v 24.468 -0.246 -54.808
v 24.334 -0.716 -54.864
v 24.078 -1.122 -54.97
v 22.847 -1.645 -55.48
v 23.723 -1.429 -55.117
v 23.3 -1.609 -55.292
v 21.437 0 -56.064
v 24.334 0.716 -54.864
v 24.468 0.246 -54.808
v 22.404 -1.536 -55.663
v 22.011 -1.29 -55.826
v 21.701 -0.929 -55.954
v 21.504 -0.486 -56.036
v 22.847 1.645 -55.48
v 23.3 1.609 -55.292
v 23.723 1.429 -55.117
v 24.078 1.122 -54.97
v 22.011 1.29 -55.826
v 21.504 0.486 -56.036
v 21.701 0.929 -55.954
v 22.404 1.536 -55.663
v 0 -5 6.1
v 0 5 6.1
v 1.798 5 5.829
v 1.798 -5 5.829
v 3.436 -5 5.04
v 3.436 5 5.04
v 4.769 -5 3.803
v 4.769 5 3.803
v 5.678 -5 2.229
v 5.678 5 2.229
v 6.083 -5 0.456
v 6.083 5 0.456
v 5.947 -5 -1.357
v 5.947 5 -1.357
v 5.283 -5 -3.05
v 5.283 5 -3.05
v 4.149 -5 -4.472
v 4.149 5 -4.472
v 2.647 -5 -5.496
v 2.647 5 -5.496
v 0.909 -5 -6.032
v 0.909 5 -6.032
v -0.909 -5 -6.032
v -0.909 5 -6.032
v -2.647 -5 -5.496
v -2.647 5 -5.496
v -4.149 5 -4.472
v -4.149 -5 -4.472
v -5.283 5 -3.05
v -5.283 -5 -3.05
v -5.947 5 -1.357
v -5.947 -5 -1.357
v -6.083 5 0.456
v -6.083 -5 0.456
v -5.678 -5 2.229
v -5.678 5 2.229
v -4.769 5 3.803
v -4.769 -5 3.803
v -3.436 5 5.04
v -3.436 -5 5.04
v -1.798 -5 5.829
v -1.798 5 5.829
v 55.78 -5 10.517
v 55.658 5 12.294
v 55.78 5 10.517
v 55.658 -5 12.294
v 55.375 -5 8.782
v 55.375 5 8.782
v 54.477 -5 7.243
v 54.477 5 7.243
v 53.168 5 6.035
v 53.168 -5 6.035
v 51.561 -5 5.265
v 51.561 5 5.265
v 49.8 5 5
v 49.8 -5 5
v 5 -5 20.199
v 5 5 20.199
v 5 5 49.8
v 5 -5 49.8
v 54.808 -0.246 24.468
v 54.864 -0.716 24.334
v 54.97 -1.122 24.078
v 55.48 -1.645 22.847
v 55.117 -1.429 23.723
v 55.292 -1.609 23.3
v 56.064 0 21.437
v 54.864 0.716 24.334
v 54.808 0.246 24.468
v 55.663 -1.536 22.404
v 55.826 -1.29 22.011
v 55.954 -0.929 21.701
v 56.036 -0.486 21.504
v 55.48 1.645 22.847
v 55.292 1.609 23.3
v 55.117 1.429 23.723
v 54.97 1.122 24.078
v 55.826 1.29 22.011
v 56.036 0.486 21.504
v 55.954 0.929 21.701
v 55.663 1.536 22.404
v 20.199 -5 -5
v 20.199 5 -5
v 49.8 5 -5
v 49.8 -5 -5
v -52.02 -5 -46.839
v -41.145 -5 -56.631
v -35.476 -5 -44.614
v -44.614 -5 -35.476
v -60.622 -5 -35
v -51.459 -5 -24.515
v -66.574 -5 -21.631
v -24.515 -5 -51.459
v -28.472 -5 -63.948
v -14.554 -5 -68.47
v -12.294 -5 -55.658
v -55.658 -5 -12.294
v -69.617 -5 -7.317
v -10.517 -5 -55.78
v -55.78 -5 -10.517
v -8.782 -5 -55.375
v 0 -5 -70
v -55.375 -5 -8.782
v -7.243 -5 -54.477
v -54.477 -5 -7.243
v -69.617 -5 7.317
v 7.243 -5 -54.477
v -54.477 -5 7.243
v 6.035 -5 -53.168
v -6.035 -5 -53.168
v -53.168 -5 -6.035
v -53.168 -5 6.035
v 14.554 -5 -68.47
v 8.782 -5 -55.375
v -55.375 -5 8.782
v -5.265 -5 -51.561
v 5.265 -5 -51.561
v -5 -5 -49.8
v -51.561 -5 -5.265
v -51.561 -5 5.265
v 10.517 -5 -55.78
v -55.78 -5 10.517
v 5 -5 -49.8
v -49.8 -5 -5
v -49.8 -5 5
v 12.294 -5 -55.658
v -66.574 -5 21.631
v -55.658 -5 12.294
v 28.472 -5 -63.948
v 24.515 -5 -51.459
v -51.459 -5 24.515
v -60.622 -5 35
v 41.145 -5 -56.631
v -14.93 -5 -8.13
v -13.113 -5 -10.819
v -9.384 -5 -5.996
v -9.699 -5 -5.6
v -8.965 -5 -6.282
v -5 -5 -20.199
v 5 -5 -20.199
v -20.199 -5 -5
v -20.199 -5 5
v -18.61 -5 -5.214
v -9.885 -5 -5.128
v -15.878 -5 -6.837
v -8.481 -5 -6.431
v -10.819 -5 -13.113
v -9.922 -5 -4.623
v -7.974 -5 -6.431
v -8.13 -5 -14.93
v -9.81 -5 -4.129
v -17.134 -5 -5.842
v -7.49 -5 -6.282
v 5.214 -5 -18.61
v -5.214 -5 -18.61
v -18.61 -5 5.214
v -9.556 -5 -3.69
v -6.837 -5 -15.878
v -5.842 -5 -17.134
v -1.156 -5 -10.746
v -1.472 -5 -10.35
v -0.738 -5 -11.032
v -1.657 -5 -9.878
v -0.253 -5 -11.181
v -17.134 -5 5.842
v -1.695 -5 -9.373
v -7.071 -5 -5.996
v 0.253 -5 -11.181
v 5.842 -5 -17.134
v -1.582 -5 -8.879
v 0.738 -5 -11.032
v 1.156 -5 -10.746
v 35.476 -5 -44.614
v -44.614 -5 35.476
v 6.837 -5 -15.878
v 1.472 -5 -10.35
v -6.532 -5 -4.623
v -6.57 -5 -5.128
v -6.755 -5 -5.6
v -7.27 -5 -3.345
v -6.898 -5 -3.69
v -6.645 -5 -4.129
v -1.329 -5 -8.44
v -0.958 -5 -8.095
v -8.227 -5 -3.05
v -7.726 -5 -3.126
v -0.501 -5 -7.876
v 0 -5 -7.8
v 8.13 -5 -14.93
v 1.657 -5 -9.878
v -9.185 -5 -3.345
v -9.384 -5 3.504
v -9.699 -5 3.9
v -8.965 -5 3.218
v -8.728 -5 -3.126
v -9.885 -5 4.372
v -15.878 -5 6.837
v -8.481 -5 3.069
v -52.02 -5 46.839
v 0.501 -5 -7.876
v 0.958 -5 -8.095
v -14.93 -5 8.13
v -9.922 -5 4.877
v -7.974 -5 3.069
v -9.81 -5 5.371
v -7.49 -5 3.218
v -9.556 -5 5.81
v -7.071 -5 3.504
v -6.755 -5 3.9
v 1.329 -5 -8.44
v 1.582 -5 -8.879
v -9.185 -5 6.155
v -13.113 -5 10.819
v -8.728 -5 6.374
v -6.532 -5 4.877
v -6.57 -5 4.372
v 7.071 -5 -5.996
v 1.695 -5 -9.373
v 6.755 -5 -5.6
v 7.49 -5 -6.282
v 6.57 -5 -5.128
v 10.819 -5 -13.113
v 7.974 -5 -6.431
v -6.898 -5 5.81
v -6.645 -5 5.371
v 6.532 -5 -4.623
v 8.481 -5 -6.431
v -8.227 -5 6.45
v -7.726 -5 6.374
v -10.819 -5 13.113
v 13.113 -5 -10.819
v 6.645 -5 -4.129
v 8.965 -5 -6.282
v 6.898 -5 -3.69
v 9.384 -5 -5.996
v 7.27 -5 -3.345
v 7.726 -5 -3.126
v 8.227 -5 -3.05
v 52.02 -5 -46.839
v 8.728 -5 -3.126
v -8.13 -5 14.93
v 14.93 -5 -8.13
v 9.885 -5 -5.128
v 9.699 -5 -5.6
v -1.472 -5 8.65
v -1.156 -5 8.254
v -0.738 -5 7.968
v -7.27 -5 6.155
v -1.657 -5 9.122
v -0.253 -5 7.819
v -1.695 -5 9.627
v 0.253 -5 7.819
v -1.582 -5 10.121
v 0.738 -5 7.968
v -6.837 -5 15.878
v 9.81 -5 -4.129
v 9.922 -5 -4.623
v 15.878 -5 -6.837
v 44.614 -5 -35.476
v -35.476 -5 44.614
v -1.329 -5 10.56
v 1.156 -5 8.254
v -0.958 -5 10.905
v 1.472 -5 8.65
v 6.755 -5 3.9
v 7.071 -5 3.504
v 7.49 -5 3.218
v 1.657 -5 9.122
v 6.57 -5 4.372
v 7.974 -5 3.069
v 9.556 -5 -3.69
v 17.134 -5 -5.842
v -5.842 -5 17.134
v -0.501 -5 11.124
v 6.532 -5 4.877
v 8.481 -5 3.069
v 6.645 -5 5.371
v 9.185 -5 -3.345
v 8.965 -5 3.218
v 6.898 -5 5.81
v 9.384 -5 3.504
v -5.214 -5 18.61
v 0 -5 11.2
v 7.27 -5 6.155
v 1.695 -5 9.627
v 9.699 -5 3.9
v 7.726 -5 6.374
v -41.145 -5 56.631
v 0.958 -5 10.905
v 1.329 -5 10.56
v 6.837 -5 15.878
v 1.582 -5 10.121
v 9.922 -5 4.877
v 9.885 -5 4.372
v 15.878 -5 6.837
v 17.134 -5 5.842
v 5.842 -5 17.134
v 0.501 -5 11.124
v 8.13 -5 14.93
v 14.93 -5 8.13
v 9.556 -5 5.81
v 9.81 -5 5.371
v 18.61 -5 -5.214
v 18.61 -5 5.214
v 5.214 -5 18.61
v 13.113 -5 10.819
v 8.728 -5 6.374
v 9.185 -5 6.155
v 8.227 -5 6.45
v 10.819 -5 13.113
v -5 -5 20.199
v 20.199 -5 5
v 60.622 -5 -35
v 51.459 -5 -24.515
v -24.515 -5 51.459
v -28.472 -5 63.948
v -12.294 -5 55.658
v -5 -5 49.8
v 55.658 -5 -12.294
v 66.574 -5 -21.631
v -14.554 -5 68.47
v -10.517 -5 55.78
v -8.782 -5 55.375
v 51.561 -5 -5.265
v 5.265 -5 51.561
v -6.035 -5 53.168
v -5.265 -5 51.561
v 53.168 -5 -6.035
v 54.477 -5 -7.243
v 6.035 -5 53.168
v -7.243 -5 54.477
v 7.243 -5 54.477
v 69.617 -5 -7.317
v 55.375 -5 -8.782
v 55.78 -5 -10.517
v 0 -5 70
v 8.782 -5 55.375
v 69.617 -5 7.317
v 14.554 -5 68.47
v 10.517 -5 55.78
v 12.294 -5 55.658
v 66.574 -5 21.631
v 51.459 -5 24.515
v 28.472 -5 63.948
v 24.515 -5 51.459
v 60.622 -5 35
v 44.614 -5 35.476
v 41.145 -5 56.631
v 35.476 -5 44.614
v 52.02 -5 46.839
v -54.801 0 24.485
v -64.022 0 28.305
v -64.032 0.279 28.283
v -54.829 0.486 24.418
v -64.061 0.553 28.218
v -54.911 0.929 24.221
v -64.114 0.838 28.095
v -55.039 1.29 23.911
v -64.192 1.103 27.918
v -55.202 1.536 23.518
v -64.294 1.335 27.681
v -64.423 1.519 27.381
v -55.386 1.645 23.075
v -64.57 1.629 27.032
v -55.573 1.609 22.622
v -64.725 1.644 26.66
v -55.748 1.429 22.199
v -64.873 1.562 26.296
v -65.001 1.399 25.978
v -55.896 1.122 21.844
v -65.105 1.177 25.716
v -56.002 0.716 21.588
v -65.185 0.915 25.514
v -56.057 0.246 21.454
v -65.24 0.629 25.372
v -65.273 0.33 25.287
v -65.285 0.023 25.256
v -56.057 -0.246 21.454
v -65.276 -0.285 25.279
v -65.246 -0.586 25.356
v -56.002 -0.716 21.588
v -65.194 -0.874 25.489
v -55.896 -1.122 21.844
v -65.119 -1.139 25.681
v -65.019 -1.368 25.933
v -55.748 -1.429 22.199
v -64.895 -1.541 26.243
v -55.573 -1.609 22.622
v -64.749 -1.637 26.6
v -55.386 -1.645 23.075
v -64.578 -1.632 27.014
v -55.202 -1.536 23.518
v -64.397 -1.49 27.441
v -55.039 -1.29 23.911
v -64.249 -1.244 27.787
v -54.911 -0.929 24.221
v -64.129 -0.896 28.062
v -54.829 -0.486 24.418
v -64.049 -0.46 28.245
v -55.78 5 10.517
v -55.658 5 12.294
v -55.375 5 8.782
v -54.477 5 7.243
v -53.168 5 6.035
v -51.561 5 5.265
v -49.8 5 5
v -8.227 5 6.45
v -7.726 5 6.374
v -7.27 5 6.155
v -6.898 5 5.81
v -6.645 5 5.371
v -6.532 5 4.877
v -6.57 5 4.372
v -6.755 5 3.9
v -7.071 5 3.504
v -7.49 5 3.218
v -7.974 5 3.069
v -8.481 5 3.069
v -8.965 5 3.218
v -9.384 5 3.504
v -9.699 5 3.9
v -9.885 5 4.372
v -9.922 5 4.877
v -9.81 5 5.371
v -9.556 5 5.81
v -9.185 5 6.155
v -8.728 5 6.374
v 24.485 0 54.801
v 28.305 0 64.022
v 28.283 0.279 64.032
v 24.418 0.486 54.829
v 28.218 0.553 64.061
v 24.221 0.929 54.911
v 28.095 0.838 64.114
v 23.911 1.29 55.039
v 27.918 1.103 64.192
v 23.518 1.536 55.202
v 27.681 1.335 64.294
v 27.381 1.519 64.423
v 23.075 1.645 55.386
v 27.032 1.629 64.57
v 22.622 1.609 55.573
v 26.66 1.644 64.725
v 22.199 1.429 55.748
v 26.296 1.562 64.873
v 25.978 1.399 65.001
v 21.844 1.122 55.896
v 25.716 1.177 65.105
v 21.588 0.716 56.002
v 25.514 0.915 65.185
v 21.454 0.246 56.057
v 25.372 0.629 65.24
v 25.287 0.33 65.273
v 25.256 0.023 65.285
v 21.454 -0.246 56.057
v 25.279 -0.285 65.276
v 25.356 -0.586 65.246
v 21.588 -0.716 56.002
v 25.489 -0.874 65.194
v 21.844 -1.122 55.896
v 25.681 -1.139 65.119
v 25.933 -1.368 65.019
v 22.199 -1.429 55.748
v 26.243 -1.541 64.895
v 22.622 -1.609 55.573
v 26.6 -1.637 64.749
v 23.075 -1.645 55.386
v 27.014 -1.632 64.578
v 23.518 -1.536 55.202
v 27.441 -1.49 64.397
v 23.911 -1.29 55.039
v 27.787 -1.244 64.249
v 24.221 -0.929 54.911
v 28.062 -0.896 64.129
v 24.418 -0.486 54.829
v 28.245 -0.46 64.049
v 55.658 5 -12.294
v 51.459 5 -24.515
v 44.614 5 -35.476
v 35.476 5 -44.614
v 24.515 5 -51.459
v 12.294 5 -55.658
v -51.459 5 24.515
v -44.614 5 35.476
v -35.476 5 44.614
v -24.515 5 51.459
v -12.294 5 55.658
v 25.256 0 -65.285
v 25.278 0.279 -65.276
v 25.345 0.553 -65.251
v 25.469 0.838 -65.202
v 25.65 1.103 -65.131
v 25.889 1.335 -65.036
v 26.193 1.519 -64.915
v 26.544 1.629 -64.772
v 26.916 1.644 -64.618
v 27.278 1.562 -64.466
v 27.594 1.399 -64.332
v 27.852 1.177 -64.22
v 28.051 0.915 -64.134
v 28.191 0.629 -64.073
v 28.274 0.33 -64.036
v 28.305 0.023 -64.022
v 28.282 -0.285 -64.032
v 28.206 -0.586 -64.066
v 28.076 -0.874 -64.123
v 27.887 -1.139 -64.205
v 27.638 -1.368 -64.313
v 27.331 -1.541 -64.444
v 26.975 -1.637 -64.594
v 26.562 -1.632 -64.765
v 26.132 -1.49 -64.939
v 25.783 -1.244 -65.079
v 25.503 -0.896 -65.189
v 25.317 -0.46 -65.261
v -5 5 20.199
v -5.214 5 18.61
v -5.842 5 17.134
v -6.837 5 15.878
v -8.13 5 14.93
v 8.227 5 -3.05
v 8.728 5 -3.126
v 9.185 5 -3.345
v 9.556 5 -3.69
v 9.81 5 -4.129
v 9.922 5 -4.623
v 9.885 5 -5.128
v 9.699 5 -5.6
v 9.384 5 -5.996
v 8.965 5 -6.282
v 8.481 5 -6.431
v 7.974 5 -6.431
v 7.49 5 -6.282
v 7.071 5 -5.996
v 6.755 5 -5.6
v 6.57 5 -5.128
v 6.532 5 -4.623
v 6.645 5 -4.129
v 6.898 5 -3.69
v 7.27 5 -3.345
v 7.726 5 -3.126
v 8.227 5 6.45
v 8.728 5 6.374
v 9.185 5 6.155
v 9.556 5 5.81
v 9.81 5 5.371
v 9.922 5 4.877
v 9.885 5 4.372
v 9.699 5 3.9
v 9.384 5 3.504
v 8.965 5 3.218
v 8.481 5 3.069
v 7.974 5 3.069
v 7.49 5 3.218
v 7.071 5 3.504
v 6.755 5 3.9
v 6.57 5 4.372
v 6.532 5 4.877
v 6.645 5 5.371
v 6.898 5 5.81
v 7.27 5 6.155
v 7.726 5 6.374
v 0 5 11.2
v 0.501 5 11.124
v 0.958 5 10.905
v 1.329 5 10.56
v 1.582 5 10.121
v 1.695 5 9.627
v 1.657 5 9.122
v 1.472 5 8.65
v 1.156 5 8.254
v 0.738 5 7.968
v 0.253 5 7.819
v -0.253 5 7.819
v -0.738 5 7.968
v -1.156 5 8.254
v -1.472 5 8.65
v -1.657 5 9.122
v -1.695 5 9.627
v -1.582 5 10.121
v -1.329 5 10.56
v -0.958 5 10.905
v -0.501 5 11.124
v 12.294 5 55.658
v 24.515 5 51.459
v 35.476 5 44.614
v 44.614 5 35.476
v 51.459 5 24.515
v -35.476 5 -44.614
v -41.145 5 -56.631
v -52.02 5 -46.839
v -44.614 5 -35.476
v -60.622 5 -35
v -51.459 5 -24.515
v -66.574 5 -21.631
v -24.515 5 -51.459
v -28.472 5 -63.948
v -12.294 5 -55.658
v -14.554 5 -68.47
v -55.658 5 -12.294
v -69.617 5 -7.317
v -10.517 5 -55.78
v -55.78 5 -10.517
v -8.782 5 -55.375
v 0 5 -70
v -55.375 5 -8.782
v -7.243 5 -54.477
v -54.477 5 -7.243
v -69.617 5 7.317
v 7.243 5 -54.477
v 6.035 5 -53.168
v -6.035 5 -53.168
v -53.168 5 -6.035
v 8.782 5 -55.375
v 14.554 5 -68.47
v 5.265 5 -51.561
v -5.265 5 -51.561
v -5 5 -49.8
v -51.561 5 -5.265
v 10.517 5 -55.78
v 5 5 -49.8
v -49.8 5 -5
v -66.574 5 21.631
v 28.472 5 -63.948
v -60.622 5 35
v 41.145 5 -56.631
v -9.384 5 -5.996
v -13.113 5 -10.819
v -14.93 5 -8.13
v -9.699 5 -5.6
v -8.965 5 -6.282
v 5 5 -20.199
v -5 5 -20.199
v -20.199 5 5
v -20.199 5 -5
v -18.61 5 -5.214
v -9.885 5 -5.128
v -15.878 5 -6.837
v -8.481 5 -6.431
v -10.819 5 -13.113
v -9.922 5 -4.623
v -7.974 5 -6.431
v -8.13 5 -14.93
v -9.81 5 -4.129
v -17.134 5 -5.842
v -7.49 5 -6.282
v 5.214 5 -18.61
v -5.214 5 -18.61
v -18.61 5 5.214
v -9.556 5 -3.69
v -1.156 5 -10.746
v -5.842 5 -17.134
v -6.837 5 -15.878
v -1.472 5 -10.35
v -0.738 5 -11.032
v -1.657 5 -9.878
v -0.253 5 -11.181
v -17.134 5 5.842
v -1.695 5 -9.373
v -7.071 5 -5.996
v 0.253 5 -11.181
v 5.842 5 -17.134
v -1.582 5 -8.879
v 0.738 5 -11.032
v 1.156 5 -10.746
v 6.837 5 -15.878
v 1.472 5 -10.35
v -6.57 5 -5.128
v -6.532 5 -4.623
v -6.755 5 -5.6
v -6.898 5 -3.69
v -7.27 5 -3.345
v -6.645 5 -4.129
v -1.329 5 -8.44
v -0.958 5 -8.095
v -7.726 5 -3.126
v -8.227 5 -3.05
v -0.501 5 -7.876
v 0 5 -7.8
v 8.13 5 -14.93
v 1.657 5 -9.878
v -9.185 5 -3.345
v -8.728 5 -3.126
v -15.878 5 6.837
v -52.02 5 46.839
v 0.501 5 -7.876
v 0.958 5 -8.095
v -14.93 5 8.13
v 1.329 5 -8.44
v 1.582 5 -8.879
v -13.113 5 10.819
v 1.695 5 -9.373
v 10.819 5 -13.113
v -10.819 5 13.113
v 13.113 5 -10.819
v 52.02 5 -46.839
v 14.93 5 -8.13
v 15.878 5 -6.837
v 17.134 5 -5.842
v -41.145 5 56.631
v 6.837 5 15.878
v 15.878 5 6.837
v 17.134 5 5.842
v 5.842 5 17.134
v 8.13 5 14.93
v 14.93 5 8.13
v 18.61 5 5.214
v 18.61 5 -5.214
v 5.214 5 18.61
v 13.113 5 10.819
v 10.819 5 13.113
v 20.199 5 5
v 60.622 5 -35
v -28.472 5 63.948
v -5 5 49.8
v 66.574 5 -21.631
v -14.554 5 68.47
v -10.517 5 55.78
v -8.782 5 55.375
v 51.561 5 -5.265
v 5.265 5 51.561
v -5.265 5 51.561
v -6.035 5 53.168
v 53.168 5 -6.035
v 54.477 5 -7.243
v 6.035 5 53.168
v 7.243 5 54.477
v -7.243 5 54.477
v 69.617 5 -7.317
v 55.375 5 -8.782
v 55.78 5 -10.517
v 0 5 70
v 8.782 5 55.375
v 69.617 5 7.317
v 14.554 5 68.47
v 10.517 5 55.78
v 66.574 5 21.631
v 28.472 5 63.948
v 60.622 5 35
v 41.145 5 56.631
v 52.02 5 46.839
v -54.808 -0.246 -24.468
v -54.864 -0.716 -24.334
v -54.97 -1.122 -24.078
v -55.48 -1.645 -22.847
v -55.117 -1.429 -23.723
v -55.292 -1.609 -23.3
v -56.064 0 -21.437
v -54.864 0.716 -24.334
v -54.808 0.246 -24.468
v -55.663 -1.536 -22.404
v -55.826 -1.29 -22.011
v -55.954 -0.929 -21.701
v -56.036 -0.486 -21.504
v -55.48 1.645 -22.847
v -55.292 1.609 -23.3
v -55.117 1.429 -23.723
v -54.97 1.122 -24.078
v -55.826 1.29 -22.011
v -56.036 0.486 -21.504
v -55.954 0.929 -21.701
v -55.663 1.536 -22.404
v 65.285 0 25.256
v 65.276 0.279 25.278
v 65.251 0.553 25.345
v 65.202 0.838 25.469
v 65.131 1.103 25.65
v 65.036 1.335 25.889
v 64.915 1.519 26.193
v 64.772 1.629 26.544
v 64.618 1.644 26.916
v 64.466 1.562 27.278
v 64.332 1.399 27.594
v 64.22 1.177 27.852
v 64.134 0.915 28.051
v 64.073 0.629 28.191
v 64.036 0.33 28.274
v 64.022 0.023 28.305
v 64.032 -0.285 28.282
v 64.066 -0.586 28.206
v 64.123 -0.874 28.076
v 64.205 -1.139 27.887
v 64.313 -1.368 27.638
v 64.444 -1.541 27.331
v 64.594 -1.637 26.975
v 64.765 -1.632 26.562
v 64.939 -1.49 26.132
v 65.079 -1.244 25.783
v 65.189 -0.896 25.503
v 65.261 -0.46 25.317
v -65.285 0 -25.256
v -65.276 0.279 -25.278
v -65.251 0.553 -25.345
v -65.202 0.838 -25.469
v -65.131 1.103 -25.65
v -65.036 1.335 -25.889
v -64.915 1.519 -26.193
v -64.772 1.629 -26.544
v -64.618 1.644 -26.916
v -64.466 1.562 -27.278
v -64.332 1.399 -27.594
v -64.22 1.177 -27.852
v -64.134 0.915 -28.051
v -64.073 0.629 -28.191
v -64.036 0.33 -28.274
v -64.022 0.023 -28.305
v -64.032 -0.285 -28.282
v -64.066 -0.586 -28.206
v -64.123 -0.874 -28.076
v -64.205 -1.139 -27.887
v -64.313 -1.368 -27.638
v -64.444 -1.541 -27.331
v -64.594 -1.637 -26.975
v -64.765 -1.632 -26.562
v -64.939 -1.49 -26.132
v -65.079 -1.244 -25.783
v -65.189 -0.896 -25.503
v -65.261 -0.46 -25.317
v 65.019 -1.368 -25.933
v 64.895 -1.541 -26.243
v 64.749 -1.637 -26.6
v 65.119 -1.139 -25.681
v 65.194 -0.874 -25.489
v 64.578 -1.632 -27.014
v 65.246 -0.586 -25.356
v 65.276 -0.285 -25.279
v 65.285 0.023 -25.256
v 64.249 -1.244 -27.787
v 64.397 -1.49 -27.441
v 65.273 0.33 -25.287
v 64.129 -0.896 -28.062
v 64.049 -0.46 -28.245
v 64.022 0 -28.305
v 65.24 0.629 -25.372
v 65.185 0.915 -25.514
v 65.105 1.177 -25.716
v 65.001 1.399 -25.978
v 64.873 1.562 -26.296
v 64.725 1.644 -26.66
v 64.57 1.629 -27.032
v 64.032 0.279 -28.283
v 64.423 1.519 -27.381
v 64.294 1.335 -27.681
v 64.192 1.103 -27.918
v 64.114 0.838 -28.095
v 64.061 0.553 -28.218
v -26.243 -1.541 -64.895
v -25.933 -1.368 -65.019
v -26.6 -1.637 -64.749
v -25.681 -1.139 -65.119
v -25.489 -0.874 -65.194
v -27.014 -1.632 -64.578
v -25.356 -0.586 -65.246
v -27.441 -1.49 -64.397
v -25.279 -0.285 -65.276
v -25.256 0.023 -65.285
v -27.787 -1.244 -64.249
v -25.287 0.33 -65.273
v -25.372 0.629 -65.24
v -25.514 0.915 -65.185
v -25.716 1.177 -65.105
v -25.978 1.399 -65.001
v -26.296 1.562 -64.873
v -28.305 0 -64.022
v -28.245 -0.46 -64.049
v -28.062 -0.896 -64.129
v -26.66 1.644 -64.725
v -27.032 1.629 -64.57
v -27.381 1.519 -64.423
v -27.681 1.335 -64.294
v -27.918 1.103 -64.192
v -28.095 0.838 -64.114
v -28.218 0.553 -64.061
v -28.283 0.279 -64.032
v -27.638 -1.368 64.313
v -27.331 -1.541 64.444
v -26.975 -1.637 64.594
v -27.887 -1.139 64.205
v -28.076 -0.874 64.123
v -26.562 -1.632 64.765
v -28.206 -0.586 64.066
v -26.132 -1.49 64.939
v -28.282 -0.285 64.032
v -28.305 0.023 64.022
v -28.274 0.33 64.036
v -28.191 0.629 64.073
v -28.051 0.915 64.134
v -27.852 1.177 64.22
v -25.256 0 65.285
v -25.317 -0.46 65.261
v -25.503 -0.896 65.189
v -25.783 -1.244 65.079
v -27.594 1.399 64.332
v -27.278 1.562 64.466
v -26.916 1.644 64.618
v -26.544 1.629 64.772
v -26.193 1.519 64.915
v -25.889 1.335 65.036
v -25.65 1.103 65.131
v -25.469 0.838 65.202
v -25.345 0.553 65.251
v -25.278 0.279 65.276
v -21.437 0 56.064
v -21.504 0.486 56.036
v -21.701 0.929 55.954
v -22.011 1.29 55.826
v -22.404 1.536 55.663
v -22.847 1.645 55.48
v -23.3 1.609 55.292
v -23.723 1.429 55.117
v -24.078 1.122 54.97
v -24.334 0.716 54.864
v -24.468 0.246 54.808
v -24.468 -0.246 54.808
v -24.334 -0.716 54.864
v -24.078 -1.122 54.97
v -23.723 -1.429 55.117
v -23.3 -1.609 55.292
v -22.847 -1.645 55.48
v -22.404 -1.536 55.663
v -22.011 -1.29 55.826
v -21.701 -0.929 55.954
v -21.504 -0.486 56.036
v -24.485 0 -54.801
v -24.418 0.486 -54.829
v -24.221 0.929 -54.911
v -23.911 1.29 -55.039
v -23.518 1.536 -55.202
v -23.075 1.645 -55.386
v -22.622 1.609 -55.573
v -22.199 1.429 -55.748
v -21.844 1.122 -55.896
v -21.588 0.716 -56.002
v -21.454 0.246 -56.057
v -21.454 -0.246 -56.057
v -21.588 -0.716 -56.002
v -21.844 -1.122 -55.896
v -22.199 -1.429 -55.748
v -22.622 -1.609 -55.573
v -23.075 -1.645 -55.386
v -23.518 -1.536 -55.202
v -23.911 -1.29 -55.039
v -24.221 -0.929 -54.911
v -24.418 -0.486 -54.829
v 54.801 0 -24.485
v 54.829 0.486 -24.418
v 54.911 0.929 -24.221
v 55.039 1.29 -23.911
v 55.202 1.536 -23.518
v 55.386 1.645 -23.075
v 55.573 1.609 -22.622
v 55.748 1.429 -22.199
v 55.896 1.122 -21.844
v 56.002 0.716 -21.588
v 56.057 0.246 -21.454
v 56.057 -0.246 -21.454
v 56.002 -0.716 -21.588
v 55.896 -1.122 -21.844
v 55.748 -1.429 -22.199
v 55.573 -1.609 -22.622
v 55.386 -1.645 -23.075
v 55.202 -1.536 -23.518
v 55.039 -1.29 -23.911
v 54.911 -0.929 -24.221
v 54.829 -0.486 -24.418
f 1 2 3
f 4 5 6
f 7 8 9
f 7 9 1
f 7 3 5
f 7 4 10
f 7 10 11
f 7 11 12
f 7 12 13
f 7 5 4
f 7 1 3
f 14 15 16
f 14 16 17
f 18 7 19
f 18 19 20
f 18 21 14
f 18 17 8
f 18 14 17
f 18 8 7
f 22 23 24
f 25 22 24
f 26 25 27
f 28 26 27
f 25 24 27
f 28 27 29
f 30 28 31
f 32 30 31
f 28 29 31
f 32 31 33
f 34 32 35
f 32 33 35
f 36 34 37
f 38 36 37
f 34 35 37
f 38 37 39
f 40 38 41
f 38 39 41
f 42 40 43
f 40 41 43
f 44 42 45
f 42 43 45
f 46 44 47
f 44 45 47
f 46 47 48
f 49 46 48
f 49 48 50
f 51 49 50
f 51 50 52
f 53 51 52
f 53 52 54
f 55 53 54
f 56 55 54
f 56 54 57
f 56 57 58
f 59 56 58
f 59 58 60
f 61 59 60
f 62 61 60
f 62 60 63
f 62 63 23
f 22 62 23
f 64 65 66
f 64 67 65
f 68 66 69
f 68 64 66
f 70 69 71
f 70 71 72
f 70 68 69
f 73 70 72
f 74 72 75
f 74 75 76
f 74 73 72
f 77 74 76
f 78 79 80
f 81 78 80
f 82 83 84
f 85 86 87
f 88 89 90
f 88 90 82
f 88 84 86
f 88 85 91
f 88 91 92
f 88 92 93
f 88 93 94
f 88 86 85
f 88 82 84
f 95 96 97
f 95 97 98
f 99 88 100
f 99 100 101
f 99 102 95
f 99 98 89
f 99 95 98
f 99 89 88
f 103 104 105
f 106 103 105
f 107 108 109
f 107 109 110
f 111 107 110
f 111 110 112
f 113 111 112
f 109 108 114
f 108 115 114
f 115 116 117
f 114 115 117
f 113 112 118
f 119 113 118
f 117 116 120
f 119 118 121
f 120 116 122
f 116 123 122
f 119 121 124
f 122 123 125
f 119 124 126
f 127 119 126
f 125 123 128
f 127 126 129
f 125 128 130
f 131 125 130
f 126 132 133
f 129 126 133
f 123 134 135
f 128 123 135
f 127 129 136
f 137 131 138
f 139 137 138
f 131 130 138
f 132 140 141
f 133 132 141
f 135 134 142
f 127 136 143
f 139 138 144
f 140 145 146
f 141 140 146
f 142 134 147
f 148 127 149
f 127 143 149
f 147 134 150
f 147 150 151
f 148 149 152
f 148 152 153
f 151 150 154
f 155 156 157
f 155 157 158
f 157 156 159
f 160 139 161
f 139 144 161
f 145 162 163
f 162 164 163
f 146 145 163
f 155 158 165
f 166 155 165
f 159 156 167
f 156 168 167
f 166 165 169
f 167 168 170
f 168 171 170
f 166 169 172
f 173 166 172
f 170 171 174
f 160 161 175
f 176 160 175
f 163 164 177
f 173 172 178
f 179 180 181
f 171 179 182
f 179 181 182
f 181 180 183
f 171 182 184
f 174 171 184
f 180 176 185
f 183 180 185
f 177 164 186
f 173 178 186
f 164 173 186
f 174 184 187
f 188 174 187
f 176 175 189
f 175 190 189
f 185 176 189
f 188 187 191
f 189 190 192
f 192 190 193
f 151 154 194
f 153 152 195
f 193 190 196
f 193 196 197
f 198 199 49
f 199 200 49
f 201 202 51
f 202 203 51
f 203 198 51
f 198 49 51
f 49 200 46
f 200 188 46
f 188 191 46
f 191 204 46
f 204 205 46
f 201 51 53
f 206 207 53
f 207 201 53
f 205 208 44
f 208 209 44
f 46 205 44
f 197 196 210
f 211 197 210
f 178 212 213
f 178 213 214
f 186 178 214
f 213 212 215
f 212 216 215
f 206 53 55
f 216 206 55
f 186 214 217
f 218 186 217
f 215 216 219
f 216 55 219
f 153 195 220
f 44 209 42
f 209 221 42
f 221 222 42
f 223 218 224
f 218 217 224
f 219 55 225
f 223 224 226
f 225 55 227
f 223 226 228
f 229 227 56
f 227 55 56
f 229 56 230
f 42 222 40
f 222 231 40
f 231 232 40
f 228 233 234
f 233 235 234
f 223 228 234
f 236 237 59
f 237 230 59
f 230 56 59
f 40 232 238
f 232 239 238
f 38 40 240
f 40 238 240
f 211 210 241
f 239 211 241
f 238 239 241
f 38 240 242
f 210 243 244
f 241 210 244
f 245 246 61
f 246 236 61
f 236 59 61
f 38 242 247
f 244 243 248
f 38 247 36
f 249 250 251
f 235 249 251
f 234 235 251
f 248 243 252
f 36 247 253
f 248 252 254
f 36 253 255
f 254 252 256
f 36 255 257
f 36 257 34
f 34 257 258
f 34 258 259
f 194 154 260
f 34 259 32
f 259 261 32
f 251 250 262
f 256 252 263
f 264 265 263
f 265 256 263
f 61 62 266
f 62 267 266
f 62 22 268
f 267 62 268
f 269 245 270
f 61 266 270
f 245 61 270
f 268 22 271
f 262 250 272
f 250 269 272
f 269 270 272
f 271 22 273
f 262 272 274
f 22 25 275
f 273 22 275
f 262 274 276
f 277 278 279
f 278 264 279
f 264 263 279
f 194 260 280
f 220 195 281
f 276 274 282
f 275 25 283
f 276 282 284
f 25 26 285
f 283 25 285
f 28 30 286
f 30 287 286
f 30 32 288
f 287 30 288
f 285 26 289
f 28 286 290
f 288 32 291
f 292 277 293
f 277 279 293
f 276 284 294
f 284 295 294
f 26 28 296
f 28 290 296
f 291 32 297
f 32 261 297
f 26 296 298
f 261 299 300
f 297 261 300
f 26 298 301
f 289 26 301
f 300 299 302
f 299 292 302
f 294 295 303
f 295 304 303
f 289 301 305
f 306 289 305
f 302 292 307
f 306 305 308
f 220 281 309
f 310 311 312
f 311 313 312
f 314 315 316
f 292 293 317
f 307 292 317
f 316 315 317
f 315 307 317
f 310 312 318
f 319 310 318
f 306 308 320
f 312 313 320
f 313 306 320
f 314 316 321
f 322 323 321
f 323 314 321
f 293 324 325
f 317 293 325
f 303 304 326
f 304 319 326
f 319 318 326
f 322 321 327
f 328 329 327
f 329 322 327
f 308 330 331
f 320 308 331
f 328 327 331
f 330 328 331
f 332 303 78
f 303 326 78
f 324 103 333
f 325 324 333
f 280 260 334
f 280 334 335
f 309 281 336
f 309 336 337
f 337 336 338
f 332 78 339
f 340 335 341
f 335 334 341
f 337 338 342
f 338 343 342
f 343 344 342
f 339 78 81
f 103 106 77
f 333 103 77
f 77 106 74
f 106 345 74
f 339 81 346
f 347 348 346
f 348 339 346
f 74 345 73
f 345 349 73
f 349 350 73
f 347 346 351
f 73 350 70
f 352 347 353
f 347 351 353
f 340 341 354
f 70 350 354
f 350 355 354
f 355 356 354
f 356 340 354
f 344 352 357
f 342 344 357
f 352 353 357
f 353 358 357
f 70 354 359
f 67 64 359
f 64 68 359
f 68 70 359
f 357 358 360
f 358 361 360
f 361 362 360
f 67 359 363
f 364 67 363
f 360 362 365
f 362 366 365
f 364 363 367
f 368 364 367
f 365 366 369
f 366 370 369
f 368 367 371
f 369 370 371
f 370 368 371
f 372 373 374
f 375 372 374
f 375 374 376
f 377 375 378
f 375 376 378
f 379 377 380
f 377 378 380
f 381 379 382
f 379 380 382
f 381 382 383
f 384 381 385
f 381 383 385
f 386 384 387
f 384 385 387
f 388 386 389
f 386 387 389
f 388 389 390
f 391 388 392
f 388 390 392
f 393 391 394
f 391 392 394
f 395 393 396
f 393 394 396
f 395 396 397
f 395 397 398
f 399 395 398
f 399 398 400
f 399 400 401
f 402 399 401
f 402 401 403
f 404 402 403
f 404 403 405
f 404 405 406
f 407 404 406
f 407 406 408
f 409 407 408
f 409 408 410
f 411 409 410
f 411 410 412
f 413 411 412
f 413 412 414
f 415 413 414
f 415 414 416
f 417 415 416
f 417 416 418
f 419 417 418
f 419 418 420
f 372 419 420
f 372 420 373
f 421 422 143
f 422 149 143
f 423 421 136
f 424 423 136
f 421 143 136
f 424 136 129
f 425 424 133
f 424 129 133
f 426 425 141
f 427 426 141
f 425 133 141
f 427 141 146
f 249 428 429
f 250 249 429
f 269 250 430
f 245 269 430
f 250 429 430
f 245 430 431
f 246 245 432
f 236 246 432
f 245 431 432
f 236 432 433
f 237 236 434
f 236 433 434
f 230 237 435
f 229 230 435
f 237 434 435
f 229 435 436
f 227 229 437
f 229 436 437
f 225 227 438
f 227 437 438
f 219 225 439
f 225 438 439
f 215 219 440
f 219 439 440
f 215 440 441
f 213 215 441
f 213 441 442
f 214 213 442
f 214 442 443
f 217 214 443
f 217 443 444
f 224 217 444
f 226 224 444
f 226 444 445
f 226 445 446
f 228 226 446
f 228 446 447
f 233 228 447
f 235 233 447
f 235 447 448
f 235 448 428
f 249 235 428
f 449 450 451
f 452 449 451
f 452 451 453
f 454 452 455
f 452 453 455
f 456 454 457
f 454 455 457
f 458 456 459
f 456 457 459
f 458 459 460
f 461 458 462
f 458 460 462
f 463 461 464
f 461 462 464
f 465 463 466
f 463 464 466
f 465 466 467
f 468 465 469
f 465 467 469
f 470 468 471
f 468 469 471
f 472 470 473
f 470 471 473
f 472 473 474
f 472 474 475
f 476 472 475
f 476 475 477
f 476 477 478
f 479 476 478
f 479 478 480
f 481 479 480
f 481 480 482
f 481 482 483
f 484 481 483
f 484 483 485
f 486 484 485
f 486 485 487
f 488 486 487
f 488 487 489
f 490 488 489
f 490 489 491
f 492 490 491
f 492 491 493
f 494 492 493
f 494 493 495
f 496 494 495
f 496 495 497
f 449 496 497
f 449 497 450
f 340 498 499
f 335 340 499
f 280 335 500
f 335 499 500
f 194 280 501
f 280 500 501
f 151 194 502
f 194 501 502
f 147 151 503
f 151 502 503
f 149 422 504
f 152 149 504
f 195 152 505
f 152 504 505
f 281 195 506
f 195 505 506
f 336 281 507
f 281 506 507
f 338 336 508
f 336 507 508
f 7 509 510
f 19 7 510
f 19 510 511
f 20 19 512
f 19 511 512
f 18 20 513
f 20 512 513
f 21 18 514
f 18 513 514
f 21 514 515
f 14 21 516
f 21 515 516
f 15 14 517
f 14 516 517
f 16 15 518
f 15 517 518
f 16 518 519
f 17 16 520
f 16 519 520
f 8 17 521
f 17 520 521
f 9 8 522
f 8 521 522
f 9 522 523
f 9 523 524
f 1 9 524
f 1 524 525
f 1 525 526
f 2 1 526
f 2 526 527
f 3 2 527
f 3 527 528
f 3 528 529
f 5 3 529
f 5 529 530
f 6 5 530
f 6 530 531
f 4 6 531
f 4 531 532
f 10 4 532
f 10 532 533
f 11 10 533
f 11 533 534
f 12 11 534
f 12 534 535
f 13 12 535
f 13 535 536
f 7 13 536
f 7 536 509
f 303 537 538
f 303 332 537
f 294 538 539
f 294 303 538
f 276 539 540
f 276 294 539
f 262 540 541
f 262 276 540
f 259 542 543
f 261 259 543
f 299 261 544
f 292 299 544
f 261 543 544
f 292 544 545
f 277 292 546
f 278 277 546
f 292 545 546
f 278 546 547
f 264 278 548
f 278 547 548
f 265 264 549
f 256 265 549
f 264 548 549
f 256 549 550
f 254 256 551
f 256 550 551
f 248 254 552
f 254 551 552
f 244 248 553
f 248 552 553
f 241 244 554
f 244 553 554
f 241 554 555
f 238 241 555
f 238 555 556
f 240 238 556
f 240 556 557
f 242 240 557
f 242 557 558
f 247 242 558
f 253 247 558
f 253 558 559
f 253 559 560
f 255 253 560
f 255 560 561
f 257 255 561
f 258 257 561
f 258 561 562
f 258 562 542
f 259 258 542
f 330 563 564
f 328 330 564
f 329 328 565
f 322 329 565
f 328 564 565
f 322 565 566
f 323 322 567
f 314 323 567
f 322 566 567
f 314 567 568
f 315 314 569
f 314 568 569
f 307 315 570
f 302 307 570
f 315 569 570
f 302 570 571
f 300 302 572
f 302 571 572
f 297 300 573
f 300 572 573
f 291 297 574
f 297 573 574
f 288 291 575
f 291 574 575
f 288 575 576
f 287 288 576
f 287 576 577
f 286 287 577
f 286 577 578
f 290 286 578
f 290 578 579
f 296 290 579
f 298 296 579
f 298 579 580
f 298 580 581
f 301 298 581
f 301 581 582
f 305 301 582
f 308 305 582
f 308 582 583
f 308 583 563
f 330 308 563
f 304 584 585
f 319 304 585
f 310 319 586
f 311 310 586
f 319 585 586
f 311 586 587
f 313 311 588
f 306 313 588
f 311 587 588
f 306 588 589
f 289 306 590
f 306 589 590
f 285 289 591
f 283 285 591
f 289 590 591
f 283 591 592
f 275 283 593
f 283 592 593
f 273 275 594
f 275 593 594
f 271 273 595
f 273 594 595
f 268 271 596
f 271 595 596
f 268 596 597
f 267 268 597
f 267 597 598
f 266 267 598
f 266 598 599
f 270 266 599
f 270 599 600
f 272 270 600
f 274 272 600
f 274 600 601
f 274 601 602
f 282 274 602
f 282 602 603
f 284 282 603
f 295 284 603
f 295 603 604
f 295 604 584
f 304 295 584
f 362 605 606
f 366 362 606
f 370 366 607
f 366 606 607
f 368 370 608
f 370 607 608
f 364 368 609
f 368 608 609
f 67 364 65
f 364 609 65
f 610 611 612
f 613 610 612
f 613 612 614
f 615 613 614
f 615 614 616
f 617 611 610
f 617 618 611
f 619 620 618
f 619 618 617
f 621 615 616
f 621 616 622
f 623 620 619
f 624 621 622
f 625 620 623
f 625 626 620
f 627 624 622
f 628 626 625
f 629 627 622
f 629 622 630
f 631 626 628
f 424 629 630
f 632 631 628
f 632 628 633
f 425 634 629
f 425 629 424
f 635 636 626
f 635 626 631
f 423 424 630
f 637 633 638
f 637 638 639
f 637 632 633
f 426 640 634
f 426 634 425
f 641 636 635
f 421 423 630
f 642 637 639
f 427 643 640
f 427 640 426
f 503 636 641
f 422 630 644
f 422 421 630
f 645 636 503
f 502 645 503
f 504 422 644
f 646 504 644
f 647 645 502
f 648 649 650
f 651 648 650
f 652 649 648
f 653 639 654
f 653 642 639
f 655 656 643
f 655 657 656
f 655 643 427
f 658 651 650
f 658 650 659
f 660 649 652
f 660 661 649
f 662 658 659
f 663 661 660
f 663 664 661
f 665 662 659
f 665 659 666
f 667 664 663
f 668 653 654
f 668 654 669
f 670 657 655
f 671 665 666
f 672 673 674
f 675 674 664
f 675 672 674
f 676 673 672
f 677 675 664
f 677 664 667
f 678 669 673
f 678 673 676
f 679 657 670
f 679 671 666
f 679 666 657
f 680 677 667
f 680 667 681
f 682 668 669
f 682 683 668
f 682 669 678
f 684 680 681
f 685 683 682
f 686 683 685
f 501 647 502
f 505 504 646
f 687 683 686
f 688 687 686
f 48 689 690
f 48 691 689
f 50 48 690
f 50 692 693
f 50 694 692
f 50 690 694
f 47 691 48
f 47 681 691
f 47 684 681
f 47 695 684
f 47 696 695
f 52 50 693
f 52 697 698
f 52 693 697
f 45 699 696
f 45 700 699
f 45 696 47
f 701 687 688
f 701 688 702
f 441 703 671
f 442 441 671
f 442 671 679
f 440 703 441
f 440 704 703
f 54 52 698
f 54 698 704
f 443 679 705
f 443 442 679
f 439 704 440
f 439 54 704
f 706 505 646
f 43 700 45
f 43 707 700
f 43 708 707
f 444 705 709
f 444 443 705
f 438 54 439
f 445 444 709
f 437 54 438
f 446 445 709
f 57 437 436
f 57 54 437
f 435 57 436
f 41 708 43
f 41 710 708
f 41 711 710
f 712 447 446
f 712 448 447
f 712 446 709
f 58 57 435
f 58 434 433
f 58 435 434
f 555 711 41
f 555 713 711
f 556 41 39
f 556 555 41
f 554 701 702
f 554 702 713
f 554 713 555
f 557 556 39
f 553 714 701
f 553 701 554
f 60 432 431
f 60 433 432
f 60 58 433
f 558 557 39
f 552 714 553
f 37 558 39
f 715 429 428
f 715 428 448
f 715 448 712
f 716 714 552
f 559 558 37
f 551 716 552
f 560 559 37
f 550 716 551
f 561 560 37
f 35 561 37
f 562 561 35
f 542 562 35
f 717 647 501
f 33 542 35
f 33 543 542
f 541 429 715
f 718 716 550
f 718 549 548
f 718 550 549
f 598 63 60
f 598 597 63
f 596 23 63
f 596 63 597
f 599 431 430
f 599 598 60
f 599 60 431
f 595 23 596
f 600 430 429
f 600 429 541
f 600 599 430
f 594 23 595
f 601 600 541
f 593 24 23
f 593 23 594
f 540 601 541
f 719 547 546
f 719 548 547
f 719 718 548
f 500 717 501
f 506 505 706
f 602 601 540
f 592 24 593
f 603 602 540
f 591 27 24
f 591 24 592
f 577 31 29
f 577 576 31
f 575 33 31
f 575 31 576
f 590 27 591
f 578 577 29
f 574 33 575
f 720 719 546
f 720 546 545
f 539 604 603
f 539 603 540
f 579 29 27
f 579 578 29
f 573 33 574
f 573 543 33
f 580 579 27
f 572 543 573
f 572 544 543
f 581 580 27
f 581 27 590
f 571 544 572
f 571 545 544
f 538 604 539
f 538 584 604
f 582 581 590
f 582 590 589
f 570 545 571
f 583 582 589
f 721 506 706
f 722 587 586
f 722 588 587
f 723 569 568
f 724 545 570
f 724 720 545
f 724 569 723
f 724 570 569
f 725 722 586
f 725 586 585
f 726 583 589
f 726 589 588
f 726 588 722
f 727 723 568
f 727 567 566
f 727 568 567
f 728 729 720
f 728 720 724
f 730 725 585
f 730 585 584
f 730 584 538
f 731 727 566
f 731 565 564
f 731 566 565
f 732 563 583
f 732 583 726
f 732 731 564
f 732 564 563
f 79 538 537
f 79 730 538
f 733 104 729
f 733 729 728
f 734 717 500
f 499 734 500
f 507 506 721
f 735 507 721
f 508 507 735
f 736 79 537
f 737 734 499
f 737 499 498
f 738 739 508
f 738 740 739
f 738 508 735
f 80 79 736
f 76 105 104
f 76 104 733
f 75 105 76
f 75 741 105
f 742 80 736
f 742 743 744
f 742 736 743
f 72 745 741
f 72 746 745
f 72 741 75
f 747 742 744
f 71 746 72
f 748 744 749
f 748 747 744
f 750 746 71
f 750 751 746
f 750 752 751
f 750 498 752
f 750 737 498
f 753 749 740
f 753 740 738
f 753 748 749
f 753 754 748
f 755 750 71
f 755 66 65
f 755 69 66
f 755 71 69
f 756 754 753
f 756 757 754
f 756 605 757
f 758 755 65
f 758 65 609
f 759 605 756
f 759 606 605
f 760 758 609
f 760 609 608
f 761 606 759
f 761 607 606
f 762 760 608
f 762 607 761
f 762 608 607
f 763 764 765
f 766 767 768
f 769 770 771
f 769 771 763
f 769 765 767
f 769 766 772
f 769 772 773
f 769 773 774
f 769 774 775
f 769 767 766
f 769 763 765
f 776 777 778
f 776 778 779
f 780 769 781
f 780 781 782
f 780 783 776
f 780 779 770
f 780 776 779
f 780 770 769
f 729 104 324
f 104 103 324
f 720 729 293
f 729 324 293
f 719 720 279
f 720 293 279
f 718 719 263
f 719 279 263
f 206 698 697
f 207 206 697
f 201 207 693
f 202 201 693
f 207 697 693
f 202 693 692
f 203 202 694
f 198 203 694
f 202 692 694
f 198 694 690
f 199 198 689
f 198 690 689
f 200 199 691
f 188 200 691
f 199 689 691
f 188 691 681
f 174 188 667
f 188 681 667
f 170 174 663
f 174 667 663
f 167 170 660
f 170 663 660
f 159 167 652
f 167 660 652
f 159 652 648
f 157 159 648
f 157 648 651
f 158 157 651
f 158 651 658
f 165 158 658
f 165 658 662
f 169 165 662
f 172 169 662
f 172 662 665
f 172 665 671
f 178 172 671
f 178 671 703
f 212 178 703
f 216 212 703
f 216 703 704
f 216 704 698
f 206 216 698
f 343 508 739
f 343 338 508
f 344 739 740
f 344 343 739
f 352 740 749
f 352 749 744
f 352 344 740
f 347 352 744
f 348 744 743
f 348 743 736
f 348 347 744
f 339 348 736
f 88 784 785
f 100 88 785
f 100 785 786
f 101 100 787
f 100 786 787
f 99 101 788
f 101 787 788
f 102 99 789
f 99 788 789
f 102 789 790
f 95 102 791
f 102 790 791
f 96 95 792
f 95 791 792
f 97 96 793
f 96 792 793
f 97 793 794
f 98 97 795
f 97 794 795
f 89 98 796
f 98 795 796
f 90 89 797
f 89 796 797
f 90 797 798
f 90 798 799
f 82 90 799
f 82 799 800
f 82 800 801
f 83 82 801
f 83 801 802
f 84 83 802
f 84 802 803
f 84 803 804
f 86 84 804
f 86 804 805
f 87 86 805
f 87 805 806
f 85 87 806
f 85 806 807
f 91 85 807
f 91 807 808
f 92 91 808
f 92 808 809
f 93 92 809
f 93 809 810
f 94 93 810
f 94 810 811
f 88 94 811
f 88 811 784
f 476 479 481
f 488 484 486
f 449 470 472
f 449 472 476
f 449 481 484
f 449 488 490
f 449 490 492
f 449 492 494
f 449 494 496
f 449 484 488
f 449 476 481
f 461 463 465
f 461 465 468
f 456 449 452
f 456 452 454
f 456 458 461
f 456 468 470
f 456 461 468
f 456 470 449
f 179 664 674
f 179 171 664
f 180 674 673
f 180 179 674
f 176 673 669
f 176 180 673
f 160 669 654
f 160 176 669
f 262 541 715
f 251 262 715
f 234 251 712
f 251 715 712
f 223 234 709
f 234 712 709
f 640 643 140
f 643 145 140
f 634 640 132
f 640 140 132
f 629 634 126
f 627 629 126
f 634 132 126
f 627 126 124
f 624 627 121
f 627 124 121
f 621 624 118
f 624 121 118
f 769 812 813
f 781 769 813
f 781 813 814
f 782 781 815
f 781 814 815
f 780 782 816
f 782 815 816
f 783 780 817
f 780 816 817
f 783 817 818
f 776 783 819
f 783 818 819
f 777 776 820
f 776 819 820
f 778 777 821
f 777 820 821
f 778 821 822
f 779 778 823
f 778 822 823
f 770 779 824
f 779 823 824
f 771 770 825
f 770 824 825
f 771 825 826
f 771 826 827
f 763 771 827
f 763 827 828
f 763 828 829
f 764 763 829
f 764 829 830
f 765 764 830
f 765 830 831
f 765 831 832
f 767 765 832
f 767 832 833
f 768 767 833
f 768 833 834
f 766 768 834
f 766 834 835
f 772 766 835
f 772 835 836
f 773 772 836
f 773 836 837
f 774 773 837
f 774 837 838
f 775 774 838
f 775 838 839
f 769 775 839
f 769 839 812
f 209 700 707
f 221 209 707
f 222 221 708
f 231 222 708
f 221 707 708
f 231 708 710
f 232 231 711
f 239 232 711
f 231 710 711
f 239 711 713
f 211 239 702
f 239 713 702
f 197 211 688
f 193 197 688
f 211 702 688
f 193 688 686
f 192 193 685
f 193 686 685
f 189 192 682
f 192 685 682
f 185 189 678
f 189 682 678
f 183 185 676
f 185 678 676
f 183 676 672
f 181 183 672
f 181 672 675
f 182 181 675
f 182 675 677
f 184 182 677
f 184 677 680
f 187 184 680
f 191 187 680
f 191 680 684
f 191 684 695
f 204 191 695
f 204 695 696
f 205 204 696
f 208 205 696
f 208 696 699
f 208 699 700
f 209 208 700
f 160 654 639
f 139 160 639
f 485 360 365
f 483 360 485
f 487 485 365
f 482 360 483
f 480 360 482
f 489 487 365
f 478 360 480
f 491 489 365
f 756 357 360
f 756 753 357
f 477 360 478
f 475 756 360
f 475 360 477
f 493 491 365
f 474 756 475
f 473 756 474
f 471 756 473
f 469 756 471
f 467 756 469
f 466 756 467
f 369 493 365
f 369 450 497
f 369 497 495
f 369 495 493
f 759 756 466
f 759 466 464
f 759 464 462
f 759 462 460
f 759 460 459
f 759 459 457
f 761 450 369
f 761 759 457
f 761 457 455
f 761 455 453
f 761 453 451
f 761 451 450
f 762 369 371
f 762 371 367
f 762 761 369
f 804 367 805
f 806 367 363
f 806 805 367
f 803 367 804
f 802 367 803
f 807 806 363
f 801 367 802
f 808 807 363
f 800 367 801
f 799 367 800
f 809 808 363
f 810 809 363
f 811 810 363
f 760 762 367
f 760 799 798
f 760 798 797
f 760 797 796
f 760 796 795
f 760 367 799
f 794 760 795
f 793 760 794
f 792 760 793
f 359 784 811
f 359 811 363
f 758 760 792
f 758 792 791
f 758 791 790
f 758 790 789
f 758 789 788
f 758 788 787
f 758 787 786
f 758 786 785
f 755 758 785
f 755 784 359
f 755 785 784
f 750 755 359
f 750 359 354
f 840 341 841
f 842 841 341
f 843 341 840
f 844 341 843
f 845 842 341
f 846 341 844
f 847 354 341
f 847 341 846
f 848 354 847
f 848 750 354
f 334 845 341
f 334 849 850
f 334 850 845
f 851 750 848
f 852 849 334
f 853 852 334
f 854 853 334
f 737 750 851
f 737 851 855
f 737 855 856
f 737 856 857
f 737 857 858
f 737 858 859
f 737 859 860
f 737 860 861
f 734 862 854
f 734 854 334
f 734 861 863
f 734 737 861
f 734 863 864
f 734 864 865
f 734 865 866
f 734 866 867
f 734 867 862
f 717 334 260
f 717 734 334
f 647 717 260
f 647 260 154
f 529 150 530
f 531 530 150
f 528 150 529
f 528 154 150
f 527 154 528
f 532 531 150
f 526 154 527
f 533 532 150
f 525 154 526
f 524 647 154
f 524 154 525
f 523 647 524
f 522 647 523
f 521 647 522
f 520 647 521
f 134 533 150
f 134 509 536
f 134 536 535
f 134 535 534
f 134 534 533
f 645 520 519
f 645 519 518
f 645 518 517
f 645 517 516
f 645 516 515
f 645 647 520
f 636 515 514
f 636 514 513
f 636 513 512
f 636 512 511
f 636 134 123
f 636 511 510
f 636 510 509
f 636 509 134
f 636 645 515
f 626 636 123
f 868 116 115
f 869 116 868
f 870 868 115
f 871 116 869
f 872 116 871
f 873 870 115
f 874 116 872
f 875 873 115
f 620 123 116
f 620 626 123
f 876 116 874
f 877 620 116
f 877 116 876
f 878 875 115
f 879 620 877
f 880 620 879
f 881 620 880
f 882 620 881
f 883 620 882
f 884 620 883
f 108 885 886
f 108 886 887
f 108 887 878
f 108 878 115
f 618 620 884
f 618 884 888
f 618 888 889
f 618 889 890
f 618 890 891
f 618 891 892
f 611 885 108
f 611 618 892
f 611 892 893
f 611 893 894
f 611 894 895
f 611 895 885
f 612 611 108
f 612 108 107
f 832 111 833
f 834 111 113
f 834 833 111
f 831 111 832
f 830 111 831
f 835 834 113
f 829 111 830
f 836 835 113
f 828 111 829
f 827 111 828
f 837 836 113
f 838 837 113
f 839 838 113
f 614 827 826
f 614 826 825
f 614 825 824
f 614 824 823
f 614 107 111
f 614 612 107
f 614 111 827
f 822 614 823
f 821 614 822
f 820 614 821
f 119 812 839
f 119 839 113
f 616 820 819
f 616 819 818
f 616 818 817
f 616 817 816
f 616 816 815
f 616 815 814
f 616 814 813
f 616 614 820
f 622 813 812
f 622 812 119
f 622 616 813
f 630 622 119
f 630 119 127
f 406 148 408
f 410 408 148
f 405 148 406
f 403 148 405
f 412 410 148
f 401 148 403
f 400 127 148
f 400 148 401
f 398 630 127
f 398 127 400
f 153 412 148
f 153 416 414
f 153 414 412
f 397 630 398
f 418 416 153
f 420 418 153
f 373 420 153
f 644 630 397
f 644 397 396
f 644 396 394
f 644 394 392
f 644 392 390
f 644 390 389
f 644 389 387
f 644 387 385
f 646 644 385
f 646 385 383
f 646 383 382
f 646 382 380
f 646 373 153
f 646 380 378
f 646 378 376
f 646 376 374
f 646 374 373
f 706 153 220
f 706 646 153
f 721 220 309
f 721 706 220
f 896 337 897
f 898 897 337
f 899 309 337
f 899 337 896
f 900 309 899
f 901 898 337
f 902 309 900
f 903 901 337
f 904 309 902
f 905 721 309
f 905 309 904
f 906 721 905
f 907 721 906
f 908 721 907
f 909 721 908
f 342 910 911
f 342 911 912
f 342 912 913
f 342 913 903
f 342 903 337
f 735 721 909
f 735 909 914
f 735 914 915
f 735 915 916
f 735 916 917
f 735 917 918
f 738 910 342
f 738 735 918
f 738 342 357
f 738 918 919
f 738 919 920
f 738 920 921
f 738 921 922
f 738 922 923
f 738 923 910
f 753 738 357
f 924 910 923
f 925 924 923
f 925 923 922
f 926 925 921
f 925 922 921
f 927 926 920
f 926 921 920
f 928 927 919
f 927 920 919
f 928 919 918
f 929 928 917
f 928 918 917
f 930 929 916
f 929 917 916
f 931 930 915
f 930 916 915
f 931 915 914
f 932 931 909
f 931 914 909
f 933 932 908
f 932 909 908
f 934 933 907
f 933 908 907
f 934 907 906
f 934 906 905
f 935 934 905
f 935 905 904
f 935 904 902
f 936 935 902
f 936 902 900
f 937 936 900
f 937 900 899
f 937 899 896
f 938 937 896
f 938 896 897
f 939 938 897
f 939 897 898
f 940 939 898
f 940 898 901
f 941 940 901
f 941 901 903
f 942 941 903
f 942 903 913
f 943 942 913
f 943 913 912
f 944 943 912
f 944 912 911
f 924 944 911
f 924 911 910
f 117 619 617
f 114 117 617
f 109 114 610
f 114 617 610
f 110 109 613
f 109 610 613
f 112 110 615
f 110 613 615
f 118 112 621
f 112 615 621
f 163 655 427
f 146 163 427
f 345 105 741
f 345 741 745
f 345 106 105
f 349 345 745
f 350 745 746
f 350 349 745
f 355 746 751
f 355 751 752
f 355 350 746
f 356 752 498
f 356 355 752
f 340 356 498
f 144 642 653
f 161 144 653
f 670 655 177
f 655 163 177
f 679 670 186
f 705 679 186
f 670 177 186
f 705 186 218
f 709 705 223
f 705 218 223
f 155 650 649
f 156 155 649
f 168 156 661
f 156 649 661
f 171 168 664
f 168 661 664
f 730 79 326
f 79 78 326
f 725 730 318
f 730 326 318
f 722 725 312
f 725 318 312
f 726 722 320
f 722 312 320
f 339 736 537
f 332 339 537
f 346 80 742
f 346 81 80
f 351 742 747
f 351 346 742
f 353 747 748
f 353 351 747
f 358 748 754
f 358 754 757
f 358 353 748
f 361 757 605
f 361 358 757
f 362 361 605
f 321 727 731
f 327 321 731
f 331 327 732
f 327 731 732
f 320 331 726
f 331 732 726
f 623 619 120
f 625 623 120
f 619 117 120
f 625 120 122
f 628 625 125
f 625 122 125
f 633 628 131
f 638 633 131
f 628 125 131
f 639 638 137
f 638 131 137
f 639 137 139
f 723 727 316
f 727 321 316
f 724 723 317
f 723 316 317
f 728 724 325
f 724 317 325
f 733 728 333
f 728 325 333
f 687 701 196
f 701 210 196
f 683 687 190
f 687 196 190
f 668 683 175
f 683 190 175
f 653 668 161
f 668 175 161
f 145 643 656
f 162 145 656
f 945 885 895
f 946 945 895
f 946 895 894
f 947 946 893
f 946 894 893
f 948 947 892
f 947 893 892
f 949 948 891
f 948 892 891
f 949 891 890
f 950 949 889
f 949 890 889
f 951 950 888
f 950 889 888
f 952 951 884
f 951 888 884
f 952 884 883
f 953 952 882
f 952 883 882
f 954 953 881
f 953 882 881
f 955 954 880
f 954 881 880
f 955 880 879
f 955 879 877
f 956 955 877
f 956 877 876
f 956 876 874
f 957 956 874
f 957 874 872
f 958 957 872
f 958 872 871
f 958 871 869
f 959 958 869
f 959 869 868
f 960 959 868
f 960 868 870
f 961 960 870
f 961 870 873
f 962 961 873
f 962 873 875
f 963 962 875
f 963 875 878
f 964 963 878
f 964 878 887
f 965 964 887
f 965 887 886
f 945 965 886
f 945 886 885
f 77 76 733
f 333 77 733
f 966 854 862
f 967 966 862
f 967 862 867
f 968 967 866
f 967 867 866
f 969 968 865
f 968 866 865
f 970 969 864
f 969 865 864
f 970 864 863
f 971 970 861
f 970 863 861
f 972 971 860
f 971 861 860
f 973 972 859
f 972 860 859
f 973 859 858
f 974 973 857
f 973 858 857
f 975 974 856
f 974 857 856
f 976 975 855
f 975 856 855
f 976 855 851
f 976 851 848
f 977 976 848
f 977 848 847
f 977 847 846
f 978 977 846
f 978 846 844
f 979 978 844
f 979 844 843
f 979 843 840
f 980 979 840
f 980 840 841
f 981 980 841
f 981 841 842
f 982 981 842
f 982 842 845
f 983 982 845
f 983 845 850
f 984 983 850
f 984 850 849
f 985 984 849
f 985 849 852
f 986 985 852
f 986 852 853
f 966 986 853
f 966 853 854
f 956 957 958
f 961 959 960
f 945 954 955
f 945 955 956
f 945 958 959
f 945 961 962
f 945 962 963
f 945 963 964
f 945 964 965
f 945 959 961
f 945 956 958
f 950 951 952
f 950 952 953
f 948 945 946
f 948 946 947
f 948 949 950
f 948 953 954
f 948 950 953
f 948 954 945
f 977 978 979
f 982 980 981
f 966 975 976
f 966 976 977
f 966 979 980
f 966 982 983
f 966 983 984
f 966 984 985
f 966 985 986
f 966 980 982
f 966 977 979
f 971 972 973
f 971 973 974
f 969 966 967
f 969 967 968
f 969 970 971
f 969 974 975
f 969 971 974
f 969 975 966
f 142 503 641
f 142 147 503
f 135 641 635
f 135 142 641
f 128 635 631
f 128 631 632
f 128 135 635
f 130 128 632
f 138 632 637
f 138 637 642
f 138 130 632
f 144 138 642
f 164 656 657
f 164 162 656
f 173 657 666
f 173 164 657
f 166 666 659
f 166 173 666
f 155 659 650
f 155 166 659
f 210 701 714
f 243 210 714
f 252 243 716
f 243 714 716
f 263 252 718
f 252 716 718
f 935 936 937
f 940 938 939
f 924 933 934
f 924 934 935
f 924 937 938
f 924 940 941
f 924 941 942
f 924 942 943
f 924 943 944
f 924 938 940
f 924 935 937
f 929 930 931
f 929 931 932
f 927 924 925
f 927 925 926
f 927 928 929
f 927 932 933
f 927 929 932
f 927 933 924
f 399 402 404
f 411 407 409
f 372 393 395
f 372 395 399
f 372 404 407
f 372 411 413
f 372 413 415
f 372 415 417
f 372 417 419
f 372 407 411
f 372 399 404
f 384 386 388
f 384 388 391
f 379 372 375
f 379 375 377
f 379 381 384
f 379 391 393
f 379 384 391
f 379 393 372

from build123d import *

# Parameters (mm, degrees)
SKETCH2_R           = 70
BOSS_EXTRUDE1_DEPTH = 5
CUT_EXTRUDE1_DEPTH  = 10
SKETCH6_R           = 6.1
CUT_EXTRUDE3_DEPTH  = 100.498743711
SKETCH7_R           = 1.7
CUT_EXTRUDE4_DEPTH  = 100.498743711
FILLET1_R           = 6
SKETCH10_R          = 1.65
CUT_EXTRUDE5_DEPTH  = 10
CIRPATTERN2_COUNT   = 8


with BuildPart() as part:
    # Sketch2 → Boss-Extrude1 (new, symmetric)
    with BuildSketch(Plane(origin=(0, 0, 0), x_dir=(1, 0, 0), z_dir=(0, 1, 0))):
        Circle(SKETCH2_R)
    extrude(amount=BOSS_EXTRUDE1_DEPTH, both=True)

    # Sketch3 → Cut-Extrude1 (cut)
    with BuildSketch(Plane(origin=(0, 5, 0), x_dir=(1, 0, 0), z_dir=(0, 1, 0))):
        with BuildLine():
            Line((5, -16.248076809), (5, -56.780278266))
            ThreePointArc((5, -56.780278266), (40.305086528, -40.305086528), (56.780278266, -5))
            Line((56.780278266, -5), (16.248076809, -5))
            ThreePointArc((16.248076809, -5), (12.02081528, -12.02081528), (5, -16.248076809))
        make_face()
        with BuildLine():
            ThreePointArc((-56.780278266, -5), (-40.305086528, -40.305086528), (-5, -56.780278266))
            Line((-5, -56.780278266), (-5, -16.248076809))
            ThreePointArc((-5, -16.248076809), (-12.02081528, -12.02081528), (-16.248076809, -5))
            Line((-16.248076809, -5), (-56.780278266, -5))
        make_face()
        with BuildLine():
            Line((16.248076809, 5), (56.780278266, 5))
            ThreePointArc((56.780278266, 5), (40.305086528, 40.305086528), (5, 56.780278266))
            Line((5, 56.780278266), (5, 16.248076809))
            ThreePointArc((5, 16.248076809), (12.02081528, 12.02081528), (16.248076809, 5))
        make_face()
        with BuildLine():
            Line((-56.780278266, 5), (-16.248076809, 5))
            ThreePointArc((-16.248076809, 5), (-12.02081528, 12.02081528), (-5, 16.248076809))
            Line((-5, 16.248076809), (-5, 56.780278266))
            ThreePointArc((-5, 56.780278266), (-40.305086528, 40.305086528), (-56.780278266, 5))
        make_face()
    extrude(amount=-CUT_EXTRUDE1_DEPTH, mode=Mode.SUBTRACT)

    # Sketch6 → Cut-Extrude3 (cut, through all)
    with BuildSketch(Plane(origin=(0, 5, 0), x_dir=(1, 0, 0), z_dir=(0, 1, 0))):
        Circle(SKETCH6_R)
    extrude(amount=-CUT_EXTRUDE3_DEPTH, mode=Mode.SUBTRACT)

    # Sketch7 → Cut-Extrude4 (cut, through all)
    with BuildSketch(Plane(origin=(0, 5, 0), x_dir=(1, 0, 0), z_dir=(0, 1, 0))):
        with Locations((0, 9.5)):
            Circle(SKETCH7_R)
        with Locations((8.227241336, 4.75)):
            Circle(SKETCH7_R)
        with Locations((8.227241336, -4.75)):
            Circle(SKETCH7_R)
        with Locations((0, -9.5)):
            Circle(SKETCH7_R)
        with Locations((-8.227241336, -4.75)):
            Circle(SKETCH7_R)
        with Locations((-8.227241336, 4.75)):
            Circle(SKETCH7_R)
    extrude(amount=-CUT_EXTRUDE4_DEPTH, mode=Mode.SUBTRACT)

    # Fillet1
    fillet1_edges = [part.edges().sort_by_distance(p)[0] for p in [
        (16.248076809, 0, 5),
        (56.780278266, 0, 5),
        (56.780278266, 0, -5),
        (16.248076809, 0, -5),
        (5, 0, -16.248076809),
        (5, 0, -56.780278266),
        (-5, 0, -56.780278266),
        (-5, 0, -16.248076809),
        (-16.248076809, 0, -5),
        (-56.780278266, 0, -5),
        (-56.780278266, 0, 5),
        (-16.248076809, 0, 5),
        (-5, 0, 16.248076809),
        (-5, 0, 56.780278266),
        (5, 0, 56.780278266),
        (5, 0, 16.248076809),
    ]]
    fillet(fillet1_edges, radius=FILLET1_R)

    # Sketch10 → Cut-Extrude5 (cut)
    with BuildSketch(Plane(origin=(64.671567276, 0, -26.787840266), x_dir=(-0.38268343236509067, 0, -0.9238795325112864), z_dir=(0.9238795325112864, 0, -0.38268343236509067))):
        Circle(SKETCH10_R)
    cut_extrude5 = extrude(amount=-CUT_EXTRUDE5_DEPTH, mode=Mode.SUBTRACT)

    # CirPattern2: Cut-Extrude5 ×8 about axis
    cirpattern2_axis = Axis((0, 5, 0), (0, -1, 0))
    for i in range(1, CIRPATTERN2_COUNT):
        add(cut_extrude5.rotate(cirpattern2_axis, i * 360 / CIRPATTERN2_COUNT), mode=Mode.SUBTRACT)


solid = part.part
